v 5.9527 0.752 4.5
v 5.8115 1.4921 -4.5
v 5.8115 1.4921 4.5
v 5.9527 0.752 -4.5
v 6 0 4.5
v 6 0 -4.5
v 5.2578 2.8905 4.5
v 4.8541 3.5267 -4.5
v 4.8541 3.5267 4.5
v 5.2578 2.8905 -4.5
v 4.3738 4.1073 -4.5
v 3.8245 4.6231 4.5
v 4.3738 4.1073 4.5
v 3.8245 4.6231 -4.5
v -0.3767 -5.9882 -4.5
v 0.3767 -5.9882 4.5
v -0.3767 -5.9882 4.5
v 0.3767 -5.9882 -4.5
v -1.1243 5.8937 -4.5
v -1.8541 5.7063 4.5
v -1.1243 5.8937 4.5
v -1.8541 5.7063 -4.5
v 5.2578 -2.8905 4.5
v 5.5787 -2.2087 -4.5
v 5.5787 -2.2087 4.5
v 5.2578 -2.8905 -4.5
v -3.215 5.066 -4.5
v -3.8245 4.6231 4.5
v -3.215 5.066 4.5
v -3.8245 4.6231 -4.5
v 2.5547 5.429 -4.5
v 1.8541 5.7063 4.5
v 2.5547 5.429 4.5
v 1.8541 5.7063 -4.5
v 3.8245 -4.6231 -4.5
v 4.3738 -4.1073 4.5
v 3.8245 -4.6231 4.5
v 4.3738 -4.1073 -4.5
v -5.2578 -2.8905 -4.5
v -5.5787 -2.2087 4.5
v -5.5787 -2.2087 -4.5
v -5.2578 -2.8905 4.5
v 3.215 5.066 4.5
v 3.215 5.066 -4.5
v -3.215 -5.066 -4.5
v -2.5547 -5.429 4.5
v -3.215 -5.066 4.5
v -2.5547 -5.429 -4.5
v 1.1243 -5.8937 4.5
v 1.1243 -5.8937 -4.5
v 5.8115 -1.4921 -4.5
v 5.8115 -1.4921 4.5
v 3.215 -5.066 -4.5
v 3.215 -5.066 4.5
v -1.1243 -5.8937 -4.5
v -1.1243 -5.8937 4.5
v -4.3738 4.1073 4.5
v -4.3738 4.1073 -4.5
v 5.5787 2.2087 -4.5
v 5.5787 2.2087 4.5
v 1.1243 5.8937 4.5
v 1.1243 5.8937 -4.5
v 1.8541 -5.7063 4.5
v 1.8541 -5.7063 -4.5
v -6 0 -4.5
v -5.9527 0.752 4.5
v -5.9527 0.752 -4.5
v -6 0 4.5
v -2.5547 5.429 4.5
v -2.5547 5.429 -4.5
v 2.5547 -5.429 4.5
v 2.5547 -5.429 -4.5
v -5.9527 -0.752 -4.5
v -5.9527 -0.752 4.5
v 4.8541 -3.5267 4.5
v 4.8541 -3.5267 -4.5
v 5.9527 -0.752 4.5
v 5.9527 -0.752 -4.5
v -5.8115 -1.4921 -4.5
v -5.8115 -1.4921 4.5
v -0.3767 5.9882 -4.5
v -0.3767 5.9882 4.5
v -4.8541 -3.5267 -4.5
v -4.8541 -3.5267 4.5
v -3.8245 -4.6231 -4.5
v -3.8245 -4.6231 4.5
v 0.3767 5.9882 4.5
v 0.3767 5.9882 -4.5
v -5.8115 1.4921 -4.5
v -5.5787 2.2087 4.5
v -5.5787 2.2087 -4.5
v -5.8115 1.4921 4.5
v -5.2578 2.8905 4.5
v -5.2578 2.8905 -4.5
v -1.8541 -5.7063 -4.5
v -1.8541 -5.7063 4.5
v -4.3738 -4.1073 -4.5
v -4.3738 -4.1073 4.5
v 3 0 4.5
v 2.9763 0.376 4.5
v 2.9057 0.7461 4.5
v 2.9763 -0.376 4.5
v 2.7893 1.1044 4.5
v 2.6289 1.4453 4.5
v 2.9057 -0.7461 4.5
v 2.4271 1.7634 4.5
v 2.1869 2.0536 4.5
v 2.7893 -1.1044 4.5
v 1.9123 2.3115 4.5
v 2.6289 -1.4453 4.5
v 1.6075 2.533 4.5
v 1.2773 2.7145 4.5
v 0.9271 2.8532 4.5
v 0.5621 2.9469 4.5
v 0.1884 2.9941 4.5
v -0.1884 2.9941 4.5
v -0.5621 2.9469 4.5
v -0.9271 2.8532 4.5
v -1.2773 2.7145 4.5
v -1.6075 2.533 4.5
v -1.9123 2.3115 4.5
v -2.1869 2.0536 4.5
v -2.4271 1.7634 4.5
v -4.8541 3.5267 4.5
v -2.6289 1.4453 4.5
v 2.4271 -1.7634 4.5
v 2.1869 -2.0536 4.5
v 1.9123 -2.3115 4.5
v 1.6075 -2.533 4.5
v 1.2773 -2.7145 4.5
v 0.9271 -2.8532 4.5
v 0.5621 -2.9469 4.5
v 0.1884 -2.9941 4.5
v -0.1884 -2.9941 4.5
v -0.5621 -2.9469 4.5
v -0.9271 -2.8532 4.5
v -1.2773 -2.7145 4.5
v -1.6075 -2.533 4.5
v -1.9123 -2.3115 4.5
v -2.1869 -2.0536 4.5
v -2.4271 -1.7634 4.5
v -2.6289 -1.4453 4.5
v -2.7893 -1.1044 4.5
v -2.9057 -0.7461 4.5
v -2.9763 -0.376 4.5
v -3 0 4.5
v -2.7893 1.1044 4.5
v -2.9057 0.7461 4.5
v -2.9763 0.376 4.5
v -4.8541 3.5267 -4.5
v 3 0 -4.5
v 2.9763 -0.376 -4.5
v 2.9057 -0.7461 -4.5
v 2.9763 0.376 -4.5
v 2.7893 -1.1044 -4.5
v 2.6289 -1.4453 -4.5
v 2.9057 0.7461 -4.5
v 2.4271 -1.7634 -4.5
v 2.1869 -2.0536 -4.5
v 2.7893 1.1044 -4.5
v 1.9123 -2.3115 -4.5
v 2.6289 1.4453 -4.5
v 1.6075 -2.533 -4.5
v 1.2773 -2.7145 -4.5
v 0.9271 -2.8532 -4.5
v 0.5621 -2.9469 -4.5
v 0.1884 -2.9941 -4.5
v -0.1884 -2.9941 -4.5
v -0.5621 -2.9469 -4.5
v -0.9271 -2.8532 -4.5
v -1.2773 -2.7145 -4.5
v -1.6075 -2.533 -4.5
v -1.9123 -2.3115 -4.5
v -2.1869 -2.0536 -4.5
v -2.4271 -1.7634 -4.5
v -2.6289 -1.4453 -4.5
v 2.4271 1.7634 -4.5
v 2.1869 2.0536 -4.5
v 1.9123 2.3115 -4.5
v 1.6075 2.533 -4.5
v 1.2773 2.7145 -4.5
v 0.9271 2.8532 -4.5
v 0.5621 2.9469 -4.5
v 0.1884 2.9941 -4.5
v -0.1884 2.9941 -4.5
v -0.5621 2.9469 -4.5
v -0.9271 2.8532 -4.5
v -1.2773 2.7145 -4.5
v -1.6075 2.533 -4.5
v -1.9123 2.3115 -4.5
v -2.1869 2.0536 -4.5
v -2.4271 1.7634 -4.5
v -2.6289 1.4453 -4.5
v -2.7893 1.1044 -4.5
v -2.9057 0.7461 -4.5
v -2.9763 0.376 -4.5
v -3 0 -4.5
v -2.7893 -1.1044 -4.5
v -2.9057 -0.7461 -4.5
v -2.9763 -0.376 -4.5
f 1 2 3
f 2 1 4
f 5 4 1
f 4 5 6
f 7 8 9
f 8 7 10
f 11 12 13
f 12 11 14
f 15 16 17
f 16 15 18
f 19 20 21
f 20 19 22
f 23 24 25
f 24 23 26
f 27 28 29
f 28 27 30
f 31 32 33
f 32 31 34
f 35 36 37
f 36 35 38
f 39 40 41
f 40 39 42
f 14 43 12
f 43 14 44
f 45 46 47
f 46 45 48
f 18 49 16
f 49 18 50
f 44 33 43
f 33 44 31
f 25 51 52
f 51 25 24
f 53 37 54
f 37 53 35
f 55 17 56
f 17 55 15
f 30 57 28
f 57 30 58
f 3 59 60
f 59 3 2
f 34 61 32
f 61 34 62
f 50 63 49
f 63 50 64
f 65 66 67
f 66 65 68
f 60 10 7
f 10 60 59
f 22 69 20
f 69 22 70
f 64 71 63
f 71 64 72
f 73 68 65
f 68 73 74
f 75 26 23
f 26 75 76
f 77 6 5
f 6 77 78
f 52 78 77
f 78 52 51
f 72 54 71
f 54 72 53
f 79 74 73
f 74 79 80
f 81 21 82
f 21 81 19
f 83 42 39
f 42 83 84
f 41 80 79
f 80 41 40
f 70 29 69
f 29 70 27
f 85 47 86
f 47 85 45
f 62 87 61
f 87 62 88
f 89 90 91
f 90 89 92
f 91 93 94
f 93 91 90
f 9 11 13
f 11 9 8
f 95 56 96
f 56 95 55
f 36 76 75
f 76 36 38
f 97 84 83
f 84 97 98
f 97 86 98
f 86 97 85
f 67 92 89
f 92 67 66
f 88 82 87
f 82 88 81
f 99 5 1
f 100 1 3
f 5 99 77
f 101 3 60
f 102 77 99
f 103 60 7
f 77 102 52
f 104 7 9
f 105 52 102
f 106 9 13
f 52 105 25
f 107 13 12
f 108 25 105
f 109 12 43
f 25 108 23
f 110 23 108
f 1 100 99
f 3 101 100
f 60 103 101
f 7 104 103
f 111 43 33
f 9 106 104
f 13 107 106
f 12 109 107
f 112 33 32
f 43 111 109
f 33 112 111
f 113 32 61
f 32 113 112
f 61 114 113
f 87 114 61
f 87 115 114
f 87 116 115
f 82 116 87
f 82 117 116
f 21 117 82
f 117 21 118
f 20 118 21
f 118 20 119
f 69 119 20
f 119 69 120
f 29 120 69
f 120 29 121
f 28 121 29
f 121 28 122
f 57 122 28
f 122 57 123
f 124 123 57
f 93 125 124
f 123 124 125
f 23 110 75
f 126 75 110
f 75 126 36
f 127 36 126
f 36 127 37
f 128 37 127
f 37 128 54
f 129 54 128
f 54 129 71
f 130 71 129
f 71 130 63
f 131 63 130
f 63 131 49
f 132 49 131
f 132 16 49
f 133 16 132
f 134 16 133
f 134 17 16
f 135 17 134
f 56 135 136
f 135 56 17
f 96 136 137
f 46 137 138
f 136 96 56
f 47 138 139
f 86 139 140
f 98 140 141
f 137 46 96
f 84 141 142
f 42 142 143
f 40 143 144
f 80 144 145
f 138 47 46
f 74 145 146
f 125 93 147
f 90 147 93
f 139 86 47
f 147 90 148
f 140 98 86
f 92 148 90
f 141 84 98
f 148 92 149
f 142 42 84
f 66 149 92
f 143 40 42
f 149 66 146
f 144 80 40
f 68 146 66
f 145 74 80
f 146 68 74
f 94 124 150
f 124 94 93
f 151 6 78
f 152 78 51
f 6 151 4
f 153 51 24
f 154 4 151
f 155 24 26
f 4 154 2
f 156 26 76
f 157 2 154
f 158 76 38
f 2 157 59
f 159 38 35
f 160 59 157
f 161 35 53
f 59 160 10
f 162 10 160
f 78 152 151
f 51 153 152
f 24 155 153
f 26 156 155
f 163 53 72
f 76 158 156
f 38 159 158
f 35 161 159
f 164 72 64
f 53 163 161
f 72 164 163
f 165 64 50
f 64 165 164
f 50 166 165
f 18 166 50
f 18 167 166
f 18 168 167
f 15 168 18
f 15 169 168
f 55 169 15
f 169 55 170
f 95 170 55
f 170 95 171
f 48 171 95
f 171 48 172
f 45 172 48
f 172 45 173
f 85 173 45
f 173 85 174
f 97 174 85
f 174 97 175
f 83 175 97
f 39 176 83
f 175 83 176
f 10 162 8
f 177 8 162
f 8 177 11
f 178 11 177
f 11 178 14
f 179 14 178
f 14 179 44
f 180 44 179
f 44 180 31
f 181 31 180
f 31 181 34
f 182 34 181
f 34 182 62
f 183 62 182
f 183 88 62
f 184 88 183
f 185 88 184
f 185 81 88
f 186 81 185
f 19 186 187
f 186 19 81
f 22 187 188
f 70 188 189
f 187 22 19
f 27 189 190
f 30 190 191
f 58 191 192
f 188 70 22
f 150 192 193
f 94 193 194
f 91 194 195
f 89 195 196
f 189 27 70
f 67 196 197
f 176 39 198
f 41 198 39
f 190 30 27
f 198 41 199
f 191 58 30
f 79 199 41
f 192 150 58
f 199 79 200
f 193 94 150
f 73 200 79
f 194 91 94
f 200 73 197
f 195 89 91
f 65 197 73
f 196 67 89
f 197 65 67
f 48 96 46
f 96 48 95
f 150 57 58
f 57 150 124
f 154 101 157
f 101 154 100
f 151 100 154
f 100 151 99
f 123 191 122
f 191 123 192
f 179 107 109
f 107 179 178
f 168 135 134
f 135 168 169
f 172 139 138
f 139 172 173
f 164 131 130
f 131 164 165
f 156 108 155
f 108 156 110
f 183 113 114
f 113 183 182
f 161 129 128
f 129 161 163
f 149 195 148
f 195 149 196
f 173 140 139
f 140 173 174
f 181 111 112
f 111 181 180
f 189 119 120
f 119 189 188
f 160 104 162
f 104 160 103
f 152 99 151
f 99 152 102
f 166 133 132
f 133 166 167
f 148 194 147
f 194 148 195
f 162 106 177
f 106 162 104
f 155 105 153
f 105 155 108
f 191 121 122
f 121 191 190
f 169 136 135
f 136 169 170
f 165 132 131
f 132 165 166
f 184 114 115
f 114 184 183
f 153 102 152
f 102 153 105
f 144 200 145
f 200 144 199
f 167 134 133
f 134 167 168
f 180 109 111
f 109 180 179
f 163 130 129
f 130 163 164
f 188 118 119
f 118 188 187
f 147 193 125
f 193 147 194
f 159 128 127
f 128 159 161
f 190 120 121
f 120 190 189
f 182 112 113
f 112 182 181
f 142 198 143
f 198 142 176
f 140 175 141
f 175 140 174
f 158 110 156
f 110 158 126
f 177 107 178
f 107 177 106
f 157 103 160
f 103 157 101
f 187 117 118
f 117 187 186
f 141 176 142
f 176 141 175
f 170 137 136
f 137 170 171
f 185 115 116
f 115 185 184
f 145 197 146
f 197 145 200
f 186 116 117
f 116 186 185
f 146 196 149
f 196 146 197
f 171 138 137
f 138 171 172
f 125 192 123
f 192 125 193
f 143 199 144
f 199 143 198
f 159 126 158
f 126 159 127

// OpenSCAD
$fn = 50;


difference() {
	union() {
		translate(v = [0, 0, -4.5000000000]) {
			cylinder(h = 9, r = 6.0000000000);
		}
	}
	union() {
		translate(v = [0, 0, -100.0000000000]) {
			cylinder(h = 200, r = 3.0000000000);
		}
	}
}
